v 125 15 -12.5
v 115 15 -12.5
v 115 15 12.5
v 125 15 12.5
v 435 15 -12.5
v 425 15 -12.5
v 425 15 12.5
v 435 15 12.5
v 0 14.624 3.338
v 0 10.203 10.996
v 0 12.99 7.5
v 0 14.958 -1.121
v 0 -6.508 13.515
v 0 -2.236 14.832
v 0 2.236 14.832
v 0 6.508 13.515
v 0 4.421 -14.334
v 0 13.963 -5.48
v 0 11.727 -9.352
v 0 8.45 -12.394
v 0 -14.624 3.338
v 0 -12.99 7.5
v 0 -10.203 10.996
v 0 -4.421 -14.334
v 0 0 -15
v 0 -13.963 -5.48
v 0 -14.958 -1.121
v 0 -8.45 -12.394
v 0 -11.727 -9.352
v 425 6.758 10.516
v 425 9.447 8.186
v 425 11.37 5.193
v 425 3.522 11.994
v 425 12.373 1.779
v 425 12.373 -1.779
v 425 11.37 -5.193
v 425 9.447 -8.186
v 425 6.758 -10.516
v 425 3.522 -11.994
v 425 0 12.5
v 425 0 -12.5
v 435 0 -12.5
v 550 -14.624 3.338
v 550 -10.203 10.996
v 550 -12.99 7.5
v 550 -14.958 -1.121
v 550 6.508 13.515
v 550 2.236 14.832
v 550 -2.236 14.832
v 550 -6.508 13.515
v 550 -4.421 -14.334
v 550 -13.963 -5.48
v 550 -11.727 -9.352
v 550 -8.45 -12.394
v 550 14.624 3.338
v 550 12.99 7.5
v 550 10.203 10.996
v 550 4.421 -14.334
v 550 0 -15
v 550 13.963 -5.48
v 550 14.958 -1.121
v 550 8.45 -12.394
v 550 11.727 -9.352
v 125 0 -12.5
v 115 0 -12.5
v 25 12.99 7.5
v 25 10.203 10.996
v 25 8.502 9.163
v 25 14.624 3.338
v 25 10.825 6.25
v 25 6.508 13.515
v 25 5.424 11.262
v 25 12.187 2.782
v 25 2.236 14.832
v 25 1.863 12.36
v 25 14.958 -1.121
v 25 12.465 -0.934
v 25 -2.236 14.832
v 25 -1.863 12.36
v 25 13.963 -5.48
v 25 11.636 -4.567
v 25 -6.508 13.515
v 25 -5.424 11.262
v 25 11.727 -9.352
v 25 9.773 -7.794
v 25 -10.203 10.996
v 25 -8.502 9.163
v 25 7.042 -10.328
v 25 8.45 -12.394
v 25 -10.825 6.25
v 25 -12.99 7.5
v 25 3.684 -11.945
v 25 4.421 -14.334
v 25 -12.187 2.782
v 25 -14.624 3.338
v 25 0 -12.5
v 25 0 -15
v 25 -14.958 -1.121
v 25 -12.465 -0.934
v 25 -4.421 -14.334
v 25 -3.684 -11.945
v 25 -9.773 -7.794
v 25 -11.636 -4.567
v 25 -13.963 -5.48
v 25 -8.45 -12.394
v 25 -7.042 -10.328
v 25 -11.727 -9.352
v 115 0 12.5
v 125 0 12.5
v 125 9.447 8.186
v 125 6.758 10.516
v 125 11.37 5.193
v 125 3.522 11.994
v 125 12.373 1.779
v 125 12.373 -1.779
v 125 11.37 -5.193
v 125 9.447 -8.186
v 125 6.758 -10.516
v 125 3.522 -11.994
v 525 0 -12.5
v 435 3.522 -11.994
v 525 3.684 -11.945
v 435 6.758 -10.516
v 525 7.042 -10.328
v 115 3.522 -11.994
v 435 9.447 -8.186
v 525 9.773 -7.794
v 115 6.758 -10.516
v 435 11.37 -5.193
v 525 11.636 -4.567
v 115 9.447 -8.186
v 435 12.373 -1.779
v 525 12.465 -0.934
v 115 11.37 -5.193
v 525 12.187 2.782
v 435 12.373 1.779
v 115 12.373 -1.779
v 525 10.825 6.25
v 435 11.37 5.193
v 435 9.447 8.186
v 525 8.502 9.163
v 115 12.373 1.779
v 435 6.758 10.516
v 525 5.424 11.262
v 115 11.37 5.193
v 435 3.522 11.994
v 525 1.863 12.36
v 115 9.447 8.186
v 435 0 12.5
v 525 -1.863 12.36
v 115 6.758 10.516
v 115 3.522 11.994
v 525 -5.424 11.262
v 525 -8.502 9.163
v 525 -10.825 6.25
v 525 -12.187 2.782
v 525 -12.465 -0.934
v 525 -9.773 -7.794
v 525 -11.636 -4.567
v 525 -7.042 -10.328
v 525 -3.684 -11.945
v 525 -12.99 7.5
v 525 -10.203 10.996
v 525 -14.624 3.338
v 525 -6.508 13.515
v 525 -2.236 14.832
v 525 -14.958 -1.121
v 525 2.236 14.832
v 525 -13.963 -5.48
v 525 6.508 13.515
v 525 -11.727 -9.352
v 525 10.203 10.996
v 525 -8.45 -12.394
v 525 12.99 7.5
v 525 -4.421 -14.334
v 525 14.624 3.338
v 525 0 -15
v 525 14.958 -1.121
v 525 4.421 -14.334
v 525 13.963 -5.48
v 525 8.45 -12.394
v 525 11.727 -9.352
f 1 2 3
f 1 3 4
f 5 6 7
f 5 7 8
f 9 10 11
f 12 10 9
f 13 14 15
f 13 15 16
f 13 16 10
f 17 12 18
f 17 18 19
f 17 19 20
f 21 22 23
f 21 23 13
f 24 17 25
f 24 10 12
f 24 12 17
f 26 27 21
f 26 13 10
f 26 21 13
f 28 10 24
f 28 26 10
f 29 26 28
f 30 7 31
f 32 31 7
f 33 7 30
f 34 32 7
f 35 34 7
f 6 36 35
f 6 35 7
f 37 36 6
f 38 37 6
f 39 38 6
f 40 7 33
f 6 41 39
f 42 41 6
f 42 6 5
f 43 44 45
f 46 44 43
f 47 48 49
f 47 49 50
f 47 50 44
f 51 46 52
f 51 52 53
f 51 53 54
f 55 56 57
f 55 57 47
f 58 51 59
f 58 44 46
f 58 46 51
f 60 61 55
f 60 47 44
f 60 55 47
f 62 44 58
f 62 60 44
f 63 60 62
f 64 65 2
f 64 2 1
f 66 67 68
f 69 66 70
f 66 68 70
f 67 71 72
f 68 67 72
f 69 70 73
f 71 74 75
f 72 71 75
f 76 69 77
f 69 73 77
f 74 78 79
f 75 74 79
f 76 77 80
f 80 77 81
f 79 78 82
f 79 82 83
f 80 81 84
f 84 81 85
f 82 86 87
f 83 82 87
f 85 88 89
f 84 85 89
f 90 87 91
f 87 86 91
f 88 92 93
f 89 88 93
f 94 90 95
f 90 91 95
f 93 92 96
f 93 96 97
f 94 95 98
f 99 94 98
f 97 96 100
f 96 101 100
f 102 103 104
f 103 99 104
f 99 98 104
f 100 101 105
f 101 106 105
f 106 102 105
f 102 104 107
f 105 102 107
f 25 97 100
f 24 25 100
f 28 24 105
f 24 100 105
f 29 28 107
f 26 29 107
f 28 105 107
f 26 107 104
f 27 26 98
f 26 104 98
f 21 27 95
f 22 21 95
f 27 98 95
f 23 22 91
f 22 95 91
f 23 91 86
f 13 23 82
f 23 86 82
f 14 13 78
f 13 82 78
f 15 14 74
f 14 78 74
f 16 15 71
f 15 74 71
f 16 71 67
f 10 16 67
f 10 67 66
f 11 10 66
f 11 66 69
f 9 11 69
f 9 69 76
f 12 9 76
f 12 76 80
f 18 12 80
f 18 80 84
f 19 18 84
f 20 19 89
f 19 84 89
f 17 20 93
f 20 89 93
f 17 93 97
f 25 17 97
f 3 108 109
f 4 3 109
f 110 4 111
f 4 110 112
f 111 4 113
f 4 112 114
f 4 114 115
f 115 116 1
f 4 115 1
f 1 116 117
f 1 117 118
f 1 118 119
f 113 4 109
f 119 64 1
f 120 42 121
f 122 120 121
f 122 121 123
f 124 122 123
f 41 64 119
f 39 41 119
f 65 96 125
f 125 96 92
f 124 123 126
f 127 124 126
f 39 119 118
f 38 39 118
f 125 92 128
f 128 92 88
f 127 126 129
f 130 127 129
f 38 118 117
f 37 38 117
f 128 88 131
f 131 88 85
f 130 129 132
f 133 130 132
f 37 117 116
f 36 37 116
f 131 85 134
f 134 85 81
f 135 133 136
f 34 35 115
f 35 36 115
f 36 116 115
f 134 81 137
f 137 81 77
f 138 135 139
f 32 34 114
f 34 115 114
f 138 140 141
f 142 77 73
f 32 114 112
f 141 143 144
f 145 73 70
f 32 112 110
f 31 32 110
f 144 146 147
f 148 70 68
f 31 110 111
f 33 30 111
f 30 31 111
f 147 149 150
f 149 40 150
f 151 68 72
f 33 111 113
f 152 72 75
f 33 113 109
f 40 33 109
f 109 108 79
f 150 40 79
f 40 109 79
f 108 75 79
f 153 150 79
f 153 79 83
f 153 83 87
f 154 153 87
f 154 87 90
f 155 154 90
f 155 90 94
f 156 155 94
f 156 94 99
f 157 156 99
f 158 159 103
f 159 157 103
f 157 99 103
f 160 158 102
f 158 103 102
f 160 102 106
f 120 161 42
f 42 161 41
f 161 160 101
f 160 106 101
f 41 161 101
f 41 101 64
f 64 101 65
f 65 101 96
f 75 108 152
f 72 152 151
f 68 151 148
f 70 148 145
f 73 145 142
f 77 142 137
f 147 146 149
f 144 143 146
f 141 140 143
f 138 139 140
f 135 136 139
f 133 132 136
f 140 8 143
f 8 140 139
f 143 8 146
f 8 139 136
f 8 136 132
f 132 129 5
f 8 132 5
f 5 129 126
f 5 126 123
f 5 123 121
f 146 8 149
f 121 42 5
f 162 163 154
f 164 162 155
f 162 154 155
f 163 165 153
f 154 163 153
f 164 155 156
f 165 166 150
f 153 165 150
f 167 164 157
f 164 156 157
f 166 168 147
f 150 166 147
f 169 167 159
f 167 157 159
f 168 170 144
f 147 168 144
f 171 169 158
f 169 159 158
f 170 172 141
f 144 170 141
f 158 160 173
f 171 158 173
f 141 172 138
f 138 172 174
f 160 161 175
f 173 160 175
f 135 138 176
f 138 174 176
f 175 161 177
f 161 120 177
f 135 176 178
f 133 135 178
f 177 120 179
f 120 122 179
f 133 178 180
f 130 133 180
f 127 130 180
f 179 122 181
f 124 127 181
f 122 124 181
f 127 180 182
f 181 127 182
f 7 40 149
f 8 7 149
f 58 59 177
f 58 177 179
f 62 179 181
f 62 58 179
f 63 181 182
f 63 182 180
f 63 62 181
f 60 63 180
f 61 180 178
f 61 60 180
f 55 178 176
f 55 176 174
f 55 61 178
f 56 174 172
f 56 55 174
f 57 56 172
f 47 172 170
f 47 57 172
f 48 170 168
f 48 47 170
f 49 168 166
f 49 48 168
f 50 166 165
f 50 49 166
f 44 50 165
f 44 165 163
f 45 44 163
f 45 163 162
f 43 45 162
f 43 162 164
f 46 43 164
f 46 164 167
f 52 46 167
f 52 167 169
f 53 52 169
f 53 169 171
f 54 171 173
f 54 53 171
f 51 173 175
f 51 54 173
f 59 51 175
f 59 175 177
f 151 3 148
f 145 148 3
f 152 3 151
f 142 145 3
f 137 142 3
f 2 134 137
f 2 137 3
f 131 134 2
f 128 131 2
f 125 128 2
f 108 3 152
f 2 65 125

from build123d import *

# Parameters (mm, degrees)
SKETCH1_R           = 12.5
BOSS_EXTRUDE1_DEPTH = 550
SKETCH2_R           = 15
BOSS_EXTRUDE2_DEPTH = 25
BOSS_EXTRUDE3_START = -25
SKETCH3_R           = 15
BOSS_EXTRUDE3_DEPTH = 25
SKETCH4_W           = 10
SKETCH4_H           = 25
BOSS_EXTRUDE4_DEPTH = 15


with BuildPart() as part:
    # Sketch1 → Boss-Extrude1 (new body)
    with BuildSketch(Plane(origin=(0, 0, 0), x_dir=(0, 0, -1), z_dir=(1, 0, 0))):
        Circle(SKETCH1_R)
    extrude(amount=BOSS_EXTRUDE1_DEPTH)

    # Sketch2 → Boss-Extrude2 (add)
    with BuildSketch(Plane(origin=(550, 0, 0), x_dir=(0, 0, -1), z_dir=(1, 0, 0))):
        Circle(SKETCH2_R)
    extrude(amount=-BOSS_EXTRUDE2_DEPTH)

    # Sketch3 → Boss-Extrude3 (add)
    with BuildSketch(Plane.ZY.offset(BOSS_EXTRUDE3_START)):
        with Locations(Location((0, 0, 0), (0, 0, 180))):
            Circle(SKETCH3_R)
    extrude(amount=BOSS_EXTRUDE3_DEPTH)

    # Sketch4 → Boss-Extrude4 (add)
    with BuildSketch(Plane(origin=(0, 0, 0), x_dir=(1, 0, 0), z_dir=(0, 1, 0))):
        with Locations((120, 0)):
            Rectangle(SKETCH4_W, SKETCH4_H)
        with Locations((430, 0)):
            Rectangle(SKETCH4_W, SKETCH4_H)
    extrude(amount=BOSS_EXTRUDE4_DEPTH)


solid = part.part
